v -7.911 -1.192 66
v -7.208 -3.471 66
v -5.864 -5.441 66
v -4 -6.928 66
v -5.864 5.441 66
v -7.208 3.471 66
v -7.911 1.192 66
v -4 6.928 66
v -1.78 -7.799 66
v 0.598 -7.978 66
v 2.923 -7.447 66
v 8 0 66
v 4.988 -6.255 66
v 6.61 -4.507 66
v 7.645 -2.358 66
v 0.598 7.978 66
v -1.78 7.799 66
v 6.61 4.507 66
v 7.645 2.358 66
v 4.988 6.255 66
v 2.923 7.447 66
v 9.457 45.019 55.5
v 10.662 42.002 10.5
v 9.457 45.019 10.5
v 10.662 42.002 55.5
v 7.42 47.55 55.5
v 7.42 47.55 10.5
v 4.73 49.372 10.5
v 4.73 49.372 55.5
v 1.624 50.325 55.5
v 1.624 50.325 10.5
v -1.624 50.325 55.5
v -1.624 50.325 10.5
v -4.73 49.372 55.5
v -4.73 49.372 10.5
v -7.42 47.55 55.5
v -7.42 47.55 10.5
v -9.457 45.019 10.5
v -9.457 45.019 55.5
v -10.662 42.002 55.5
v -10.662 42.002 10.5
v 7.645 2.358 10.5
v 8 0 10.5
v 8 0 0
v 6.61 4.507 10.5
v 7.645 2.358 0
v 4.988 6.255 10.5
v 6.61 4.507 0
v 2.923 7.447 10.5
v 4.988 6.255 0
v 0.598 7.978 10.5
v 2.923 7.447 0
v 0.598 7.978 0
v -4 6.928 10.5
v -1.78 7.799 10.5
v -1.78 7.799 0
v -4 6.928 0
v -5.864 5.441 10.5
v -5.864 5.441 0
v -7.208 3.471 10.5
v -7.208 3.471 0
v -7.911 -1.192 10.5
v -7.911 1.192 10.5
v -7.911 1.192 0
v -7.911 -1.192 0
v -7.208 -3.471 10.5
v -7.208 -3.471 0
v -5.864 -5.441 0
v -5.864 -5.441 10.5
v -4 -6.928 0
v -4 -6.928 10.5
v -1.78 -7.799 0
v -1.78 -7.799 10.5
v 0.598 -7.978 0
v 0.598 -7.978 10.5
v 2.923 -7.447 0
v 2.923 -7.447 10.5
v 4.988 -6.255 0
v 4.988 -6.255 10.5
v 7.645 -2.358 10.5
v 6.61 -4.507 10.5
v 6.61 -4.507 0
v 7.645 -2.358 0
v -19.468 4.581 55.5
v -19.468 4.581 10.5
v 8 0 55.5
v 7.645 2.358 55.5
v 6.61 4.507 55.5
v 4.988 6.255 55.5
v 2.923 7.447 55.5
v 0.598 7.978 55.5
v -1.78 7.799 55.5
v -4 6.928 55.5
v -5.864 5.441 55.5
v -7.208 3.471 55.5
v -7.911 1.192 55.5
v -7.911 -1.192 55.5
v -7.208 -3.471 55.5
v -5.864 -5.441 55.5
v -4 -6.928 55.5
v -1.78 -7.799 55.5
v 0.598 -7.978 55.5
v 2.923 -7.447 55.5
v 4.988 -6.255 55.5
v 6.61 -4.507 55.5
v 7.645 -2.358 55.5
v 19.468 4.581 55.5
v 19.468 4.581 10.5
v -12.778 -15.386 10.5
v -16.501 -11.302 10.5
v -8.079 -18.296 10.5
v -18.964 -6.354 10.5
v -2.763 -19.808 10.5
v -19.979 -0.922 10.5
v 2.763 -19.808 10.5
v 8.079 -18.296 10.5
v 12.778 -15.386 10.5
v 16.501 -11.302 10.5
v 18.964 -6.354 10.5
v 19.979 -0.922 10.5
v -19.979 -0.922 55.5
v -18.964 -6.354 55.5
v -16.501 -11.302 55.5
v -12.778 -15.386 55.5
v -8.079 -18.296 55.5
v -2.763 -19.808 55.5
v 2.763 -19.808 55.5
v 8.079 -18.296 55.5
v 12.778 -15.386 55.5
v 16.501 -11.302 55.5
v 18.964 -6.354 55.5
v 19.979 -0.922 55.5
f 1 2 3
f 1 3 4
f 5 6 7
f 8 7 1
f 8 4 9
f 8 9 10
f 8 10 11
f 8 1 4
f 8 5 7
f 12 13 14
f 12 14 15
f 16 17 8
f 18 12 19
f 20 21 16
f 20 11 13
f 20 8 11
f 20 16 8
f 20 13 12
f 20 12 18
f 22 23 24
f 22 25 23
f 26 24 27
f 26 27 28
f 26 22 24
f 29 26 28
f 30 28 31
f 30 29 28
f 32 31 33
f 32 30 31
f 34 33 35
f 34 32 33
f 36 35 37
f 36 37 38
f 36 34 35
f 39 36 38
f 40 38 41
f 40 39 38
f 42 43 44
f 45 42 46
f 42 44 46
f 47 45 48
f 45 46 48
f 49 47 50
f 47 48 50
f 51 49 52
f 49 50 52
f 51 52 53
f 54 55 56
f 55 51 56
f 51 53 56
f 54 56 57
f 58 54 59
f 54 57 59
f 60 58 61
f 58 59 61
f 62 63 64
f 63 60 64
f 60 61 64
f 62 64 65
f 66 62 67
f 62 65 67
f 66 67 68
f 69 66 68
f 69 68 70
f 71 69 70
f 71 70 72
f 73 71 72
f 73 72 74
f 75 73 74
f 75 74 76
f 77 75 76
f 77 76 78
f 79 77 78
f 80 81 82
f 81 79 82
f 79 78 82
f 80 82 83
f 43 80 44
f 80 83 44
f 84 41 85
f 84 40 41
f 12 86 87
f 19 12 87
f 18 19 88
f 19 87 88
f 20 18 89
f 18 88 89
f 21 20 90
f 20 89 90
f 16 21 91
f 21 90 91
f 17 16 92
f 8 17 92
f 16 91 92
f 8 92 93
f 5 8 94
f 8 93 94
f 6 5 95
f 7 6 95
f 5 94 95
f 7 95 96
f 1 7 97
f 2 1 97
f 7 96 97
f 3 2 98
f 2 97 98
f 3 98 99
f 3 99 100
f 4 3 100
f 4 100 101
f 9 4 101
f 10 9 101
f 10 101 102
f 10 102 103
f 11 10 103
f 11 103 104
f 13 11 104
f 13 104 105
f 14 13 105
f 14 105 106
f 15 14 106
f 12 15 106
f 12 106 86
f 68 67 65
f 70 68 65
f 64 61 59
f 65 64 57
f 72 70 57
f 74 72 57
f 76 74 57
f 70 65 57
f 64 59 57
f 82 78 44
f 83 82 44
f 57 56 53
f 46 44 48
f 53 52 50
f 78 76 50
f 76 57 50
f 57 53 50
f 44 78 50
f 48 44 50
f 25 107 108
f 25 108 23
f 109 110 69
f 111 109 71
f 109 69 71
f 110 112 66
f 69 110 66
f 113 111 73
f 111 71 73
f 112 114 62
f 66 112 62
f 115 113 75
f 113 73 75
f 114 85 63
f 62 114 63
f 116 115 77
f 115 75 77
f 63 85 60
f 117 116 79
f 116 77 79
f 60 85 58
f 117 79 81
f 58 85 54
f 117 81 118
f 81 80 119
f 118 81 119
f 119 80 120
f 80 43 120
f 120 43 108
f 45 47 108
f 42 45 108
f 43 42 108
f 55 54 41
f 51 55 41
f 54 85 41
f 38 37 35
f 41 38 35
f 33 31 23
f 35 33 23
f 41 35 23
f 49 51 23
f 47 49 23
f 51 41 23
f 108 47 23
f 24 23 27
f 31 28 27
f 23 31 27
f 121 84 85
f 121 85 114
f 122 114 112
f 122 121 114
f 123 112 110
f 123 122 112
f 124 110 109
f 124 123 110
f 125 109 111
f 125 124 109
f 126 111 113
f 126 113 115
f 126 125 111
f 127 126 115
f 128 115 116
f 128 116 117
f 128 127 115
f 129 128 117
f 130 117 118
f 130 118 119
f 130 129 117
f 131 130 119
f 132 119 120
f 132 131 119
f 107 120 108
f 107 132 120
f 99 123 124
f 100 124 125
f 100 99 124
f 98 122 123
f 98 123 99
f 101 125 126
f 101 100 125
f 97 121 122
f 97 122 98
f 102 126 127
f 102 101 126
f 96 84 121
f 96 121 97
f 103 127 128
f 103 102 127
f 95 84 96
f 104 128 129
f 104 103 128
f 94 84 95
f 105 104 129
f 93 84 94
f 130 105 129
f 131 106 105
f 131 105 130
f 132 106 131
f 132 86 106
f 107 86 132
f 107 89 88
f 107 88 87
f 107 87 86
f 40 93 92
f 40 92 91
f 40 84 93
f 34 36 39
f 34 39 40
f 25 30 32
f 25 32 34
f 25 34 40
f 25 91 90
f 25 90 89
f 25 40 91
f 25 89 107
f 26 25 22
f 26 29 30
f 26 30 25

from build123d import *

# Parameters (mm, degrees)
SKETCH1_R           = 8
BOSS_EXTRUDE1_DEPTH = 66
BOSS_EXTRUDE2_DEPTH = 22.5


with BuildPart() as part:
    # Sketch1 → Boss-Extrude1 (new body)
    with BuildSketch(Plane.XY):
        Circle(SKETCH1_R)
    extrude(amount=BOSS_EXTRUDE1_DEPTH)

    # Sketch2 → Boss-Extrude2 (add, symmetric)
    with BuildSketch(Plane.XY.offset(33)):
        with BuildLine():
            Line((-10.662181086, 42.002247261), (-19.468214294, 4.581335198))
            ThreePointArc((-19.468214294, 4.581335198), (0, -20), (19.468214294, 4.581335198))
            Line((19.468214294, 4.581335198), (10.662181086, 42.002247261))
            ThreePointArc((10.662181086, 42.002247261), (0, 50.44660655), (-10.662181086, 42.002247261))
        make_face()
    extrude(amount=BOSS_EXTRUDE2_DEPTH, both=True)


solid = part.part
